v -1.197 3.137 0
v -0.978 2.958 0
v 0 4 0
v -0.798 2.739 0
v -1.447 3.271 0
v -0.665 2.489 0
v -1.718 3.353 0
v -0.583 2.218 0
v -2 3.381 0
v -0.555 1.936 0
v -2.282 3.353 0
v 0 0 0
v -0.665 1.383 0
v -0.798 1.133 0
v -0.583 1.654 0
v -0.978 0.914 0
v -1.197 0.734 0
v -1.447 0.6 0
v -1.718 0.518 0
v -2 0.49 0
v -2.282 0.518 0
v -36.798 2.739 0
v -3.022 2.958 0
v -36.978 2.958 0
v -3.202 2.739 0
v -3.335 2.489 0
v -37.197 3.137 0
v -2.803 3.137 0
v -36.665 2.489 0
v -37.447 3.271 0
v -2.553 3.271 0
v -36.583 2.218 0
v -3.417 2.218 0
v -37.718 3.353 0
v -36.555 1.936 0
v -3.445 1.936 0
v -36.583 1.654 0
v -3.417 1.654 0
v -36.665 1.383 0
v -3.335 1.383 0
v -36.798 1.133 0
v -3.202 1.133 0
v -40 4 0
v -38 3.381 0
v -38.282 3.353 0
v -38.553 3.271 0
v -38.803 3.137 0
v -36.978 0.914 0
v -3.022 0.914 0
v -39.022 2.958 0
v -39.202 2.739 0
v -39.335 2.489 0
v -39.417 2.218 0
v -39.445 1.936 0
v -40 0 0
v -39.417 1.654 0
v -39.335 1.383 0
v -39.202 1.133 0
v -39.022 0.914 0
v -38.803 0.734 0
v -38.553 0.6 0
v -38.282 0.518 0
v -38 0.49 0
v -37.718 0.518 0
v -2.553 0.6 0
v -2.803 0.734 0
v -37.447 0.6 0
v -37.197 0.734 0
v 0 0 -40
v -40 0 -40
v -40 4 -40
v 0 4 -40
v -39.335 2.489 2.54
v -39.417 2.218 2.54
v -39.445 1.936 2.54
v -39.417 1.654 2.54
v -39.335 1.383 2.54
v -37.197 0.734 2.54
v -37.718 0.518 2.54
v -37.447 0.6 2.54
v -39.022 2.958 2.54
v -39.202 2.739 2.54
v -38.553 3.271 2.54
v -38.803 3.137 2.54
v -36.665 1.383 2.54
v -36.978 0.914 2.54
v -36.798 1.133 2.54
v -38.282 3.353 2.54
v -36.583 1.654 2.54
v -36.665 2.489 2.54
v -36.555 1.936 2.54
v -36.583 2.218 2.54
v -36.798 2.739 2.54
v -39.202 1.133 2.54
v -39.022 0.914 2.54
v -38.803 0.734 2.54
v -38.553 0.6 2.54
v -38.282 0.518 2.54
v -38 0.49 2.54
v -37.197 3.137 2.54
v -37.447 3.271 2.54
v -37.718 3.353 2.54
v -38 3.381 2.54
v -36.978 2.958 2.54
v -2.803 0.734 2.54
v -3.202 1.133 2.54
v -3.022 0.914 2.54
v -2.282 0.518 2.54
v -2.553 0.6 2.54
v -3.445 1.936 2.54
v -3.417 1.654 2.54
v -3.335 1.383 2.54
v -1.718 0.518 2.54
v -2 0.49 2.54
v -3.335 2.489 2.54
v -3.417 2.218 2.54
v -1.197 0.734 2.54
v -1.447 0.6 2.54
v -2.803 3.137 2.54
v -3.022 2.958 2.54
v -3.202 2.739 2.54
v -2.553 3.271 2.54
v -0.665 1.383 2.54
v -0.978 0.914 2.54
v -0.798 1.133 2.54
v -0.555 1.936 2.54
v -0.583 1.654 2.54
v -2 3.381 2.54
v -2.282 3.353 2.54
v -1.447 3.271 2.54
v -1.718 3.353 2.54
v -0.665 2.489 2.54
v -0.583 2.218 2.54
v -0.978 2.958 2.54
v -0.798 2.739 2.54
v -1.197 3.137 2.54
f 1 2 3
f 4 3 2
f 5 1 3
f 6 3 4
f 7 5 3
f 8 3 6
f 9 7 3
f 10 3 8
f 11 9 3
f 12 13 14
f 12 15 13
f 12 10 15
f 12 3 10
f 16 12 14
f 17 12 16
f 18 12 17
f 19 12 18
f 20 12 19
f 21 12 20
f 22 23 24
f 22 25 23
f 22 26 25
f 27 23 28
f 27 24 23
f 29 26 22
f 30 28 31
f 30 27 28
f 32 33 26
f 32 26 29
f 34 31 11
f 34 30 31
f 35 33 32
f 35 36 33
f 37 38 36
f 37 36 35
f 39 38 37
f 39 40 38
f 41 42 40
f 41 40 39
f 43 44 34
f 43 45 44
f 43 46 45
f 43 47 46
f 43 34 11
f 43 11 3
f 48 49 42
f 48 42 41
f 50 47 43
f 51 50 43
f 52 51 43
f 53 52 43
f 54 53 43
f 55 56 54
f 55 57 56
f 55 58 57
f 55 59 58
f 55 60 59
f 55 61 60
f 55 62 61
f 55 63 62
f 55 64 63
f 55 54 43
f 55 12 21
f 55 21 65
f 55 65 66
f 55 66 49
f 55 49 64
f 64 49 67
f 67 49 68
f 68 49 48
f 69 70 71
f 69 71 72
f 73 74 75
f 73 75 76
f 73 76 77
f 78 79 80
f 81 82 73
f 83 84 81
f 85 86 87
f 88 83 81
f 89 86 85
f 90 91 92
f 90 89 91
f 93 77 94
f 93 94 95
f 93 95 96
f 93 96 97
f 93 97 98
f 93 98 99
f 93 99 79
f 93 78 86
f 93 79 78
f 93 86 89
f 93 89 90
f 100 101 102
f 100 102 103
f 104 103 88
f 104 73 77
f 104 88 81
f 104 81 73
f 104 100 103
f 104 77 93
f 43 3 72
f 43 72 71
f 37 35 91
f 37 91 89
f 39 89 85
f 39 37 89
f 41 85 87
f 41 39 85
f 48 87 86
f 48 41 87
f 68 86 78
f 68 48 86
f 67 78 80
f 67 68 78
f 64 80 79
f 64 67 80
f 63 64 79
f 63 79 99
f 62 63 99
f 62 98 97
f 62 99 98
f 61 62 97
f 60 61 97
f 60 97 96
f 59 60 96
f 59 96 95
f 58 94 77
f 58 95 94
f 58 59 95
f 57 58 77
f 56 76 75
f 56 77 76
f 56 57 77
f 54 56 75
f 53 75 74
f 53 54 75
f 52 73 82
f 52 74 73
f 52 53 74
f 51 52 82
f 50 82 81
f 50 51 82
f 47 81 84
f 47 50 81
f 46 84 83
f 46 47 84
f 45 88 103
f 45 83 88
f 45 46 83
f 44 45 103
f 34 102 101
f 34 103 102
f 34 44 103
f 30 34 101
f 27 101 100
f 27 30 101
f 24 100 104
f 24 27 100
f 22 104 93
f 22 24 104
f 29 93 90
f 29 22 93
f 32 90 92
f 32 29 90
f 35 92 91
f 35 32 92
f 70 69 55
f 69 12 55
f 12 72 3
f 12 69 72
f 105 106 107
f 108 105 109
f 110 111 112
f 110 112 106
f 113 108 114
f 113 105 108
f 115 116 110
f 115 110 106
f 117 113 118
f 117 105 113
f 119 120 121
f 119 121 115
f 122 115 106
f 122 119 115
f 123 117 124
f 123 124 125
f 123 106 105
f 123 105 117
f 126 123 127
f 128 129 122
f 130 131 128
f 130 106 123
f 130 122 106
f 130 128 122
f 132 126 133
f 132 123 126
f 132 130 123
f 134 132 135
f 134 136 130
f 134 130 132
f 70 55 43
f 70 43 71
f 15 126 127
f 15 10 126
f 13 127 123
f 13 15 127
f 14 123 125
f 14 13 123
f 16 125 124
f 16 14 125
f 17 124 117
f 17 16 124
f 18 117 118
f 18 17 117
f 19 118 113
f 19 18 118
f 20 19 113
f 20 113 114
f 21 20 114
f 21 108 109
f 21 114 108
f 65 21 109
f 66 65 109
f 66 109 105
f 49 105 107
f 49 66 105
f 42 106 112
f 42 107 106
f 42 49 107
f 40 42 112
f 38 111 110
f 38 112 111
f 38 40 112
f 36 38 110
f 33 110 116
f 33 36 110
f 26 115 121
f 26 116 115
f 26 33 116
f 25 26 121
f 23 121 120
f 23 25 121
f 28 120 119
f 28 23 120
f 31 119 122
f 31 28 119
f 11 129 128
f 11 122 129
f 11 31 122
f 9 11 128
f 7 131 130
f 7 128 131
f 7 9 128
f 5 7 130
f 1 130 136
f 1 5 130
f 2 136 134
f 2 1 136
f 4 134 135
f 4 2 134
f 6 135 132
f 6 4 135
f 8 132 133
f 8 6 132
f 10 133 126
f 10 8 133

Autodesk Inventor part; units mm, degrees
ref_plane "YZ Plane" through (0, 0, 0) normal (1, 0, 0) x (0, 1, 0)
ref_plane "XZ Plane" through (0, 0, 0) normal (0, 1, 0) x (-1, 0, 0)
ref_plane "XY Plane" through (0, 0, 0) normal (0, 0, 1) x (1, 0, 0)
sketch "Sketch1" plane through (0, 0, 0) normal (0, 1, 0) x (-1, 0, 0)
  line L0 (0, 0) -> (40, 0)
  line L1 (40, 0) -> (40, -40)
  line L2 (40, -40) -> (0, -40)
  line L3 (0, -40) -> (0, 0)
  dimension "d0" = 40
extrude "Extrusion1" add sketch "Sketch1" along normal blind 4
sketch "Sketch2" plane through (-40, 0, 0) normal (0, 0, 1) x (1, 0, 0)
  circle A0 centre (2, 1.9356) radius 1.4452
  line L0 (0, 0) -> (0, 4) projected
  line L1 (0, 4) -> (40, 4) projected
  line L2 (20, 17.4012) -> (20, -9.9341)
  circle A1 centre (38, 1.9356) radius 1.4452
  point P0 (40, 0)
  dimension "d3" = 2
  dimension "d4" = 40
  dimension "d5" = 20
extrude "Extrusion2" add sketch "Sketch2" along normal blind 2.54
equation "\"d5\" = 0.5 * d4"
properties part number "SP1848-27145 4.8V Seebeck Thermoelectric Power Generator TEG Peltier Module"
